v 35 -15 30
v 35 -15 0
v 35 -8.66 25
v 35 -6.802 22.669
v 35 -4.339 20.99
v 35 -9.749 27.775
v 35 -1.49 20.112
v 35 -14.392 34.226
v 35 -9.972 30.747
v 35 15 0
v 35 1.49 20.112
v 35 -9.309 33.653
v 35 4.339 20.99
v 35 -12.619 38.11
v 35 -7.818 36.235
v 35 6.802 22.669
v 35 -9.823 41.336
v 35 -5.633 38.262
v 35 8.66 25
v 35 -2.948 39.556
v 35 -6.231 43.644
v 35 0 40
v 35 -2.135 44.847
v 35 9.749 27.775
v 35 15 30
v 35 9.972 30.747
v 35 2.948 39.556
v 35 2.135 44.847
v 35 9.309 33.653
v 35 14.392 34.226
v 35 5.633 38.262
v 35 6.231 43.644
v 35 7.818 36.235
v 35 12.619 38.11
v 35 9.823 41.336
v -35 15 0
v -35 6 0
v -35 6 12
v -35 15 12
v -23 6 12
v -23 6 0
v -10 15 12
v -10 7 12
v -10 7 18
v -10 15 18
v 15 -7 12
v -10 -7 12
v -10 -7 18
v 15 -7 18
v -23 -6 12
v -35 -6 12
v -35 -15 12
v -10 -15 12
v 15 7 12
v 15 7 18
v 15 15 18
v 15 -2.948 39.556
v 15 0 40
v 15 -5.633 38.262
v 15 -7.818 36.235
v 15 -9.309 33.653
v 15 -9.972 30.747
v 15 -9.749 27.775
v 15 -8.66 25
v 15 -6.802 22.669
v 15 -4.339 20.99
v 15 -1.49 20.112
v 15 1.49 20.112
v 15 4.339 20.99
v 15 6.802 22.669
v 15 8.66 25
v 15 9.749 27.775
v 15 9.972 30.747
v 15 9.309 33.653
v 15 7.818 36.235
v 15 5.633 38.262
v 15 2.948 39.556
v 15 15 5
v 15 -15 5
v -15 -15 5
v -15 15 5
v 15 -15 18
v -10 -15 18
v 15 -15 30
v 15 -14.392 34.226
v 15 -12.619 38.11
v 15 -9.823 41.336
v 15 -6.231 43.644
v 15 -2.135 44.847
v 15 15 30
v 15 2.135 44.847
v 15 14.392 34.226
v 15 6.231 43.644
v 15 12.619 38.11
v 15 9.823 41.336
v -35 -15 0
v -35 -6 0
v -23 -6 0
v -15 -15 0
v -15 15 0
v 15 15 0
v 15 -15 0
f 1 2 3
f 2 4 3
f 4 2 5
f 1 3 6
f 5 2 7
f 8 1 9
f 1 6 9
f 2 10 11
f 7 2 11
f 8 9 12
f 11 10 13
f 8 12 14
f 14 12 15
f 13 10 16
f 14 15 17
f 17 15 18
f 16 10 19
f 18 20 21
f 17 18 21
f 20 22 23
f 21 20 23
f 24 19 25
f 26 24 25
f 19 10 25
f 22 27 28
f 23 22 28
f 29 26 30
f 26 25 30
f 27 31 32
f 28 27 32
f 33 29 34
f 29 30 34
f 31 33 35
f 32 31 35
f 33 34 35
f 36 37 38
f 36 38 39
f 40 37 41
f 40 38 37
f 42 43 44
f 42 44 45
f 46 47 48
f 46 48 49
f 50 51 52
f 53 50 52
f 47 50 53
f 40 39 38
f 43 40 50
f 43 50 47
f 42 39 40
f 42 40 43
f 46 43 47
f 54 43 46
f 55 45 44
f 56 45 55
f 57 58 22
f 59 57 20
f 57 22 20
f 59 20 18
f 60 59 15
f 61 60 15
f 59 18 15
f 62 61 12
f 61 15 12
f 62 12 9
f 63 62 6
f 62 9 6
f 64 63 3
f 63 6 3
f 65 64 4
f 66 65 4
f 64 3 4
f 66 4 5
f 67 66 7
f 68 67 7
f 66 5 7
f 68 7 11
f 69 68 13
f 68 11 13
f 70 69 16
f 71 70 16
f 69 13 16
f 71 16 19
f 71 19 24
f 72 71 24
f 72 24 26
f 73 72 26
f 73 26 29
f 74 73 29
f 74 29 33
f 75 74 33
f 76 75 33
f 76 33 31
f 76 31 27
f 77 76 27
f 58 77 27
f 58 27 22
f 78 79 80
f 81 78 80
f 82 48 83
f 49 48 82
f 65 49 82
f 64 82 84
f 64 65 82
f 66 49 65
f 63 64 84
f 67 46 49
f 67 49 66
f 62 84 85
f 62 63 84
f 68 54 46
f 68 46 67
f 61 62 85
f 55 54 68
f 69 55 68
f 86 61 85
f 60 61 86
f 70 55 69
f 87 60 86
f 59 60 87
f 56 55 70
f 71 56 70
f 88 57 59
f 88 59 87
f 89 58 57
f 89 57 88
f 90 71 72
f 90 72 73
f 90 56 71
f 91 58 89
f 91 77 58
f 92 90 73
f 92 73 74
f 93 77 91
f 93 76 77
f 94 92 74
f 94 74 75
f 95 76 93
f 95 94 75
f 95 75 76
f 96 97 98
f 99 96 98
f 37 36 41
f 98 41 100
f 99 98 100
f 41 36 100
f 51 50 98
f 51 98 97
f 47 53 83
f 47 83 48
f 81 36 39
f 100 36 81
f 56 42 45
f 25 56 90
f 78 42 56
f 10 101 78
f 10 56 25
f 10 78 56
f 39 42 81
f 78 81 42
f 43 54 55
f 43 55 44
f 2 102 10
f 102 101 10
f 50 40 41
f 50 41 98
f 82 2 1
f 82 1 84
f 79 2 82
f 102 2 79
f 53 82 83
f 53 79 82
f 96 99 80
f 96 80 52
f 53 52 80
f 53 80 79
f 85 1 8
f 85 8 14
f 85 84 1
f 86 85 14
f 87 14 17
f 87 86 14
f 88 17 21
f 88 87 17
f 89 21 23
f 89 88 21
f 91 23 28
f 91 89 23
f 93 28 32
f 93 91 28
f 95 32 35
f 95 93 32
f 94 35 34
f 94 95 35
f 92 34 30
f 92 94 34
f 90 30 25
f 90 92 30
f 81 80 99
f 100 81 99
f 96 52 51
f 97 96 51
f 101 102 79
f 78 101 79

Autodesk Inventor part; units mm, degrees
ref_plane "YZ Plane" through (0, 0, 0) normal (1, 0, 0) x (0, 1, 0)
ref_plane "XZ Plane" through (0, 0, 0) normal (0, 1, 0) x (-1, 0, 0)
ref_plane "XY Plane" through (0, 0, 0) normal (0, 0, 1) x (1, 0, 0)
sketch "Эскиз1" plane through (0, 0, 0) normal (0, 0, 1) x (1, 0, 0)
  line L0 (-35, 15) -> (35, 15)
  line L1 (35, 15) -> (35, -15)
  line L2 (35, -15) -> (-35, -15)
  line L3 (-35, -15) -> (-35, 15)
  point P0 (0, 0)
  dimension "d0" = 70
  dimension "d1" = 30
  dimension "d2" = 15
  dimension "d3" = 35
extrude "Выдавливание1" add sketch "Эскиз1" along normal blind 12
sketch "Эскиз2" plane through (0, 0, 12) normal (0, 0, 1) x (1, 0, 0)
  line L0 (-35, 6) -> (-23, 6)
  line L1 (-23, 6) -> (-23, -6)
  line L2 (-23, -6) -> (-35, -6)
  line L3 (-35, -6) -> (-35, 6)
  point P0 (0, 0)
  dimension "d6" = 6
  dimension "d7" = 6
  dimension "d8" = 12
  dimension "d9" = 35
extrude "Выдавливание2" cut sketch "Эскиз2" against normal blind 12
sketch "Эскиз3" plane through (-35, -15, 0) normal (0, -1, 0) x (1, 0, 0)
  line L0 (70, 0) -> (0, 0) projected
  line L1 (20, 0) -> (50, 0)
  line L2 (50, 0) -> (50, 5)
  line L3 (50, 5) -> (20, 5)
  line L4 (20, 5) -> (20, 0)
  point P0 (35, 0)
  dimension "d12" = 30
  dimension "d13" = 5
  dimension "d14" = 20
extrude "Выдавливание3" cut sketch "Эскиз3" against normal blind 30
sketch "Эскиз4" plane through (0, 0, 12) normal (0, 0, 1) x (1, 0, 0)
  line L0 (-10, 15) -> (15, 15)
  line L1 (15, 15) -> (15, 7)
  line L2 (15, 7) -> (-10, 7)
  line L3 (-10, 7) -> (-10, 15)
  line L4 (15, -15) -> (-10, -15)
  line L5 (-10, -15) -> (-10, -7)
  line L6 (-10, -7) -> (15, -7)
  line L7 (15, -7) -> (15, -15)
  line L8 (35, -15) -> (35, 15) projected
  line L9 (-35, 15) -> (-35, 6) projected
  line L10 (-35, -6) -> (-35, -15) projected
  line L11 (-35, 6) -> (-23, 6) projected
  line L12 (-23, 6) -> (-23, -6) projected
  line L13 (-23, -6) -> (-35, -6) projected
  line L14 (-35, -6) -> (-35, -15) projected
  line L15 (-35, -15) -> (35, -15) projected
  line L16 (35, -15) -> (35, 15) projected
  line L17 (35, 15) -> (-35, 15) projected
  line L18 (-35, 15) -> (-35, 6) projected
  point P0 (0, 0)
  dimension "d17" = 20
  dimension "d18" = 20
  dimension "d19" = 25
  dimension "d20" = 25
  dimension "d21" = 14
  dimension "d22" = 8
  dimension "d23" = 8
  dimension "d24" = 7
extrude "Выдавливание4" add sketch "Эскиз4" along normal blind 6 contours L0 L1 L2 L3 | L4 L5 L6 L7
sketch "Эскиз5" plane through (0, 0, 12) normal (0, 0, 1) x (1, 0, 0)
  line L0 (15, 15) -> (35, 15)
  line L1 (35, 15) -> (35, -15)
  line L2 (35, -15) -> (15, -15)
  line L3 (15, -15) -> (15, 15)
  point P0 (0, 0)
extrude "Выдавливание5" add sketch "Эскиз5" along normal blind 18
sketch "Эскиз6" plane through (15, -7, 12) normal (-1, 0, 0) x (0, 0, 1)
  circle A0 centre (18, 7) radius 15
  point P0 (-12, 7)
  point P1 (18, 22)
  point P2 (18, -8)
  dimension "d29" = 30
extrude "Выдавливание6" add sketch "Эскиз6" against normal blind 20
sketch "Эскиз7" plane through (15, -7, 12) normal (-1, 0, 0) x (0, 0, 1)
  line L0 (0, 14) -> (6, 14) projected
  line L1 (0, 0) -> (0, 14) projected
  line L2 (0, 0) -> (6, 0) projected
  line L3 (6, -8) -> (6, 0) projected
  line L4 (6, -8) -> (18, -8) projected
  arc A0 (18, -8) -> (18, 22) centre (18, 7) ccw projected
  line L5 (6, 22) -> (18, 22) projected
  line L6 (6, 14) -> (6, 22) projected
  point P0 (-12, 7)
hole "Отверстие1" at (15, 0, 30) direction (1, 0, 0) diameter 20 depth 20 tip angle 118
properties part number "трон"
